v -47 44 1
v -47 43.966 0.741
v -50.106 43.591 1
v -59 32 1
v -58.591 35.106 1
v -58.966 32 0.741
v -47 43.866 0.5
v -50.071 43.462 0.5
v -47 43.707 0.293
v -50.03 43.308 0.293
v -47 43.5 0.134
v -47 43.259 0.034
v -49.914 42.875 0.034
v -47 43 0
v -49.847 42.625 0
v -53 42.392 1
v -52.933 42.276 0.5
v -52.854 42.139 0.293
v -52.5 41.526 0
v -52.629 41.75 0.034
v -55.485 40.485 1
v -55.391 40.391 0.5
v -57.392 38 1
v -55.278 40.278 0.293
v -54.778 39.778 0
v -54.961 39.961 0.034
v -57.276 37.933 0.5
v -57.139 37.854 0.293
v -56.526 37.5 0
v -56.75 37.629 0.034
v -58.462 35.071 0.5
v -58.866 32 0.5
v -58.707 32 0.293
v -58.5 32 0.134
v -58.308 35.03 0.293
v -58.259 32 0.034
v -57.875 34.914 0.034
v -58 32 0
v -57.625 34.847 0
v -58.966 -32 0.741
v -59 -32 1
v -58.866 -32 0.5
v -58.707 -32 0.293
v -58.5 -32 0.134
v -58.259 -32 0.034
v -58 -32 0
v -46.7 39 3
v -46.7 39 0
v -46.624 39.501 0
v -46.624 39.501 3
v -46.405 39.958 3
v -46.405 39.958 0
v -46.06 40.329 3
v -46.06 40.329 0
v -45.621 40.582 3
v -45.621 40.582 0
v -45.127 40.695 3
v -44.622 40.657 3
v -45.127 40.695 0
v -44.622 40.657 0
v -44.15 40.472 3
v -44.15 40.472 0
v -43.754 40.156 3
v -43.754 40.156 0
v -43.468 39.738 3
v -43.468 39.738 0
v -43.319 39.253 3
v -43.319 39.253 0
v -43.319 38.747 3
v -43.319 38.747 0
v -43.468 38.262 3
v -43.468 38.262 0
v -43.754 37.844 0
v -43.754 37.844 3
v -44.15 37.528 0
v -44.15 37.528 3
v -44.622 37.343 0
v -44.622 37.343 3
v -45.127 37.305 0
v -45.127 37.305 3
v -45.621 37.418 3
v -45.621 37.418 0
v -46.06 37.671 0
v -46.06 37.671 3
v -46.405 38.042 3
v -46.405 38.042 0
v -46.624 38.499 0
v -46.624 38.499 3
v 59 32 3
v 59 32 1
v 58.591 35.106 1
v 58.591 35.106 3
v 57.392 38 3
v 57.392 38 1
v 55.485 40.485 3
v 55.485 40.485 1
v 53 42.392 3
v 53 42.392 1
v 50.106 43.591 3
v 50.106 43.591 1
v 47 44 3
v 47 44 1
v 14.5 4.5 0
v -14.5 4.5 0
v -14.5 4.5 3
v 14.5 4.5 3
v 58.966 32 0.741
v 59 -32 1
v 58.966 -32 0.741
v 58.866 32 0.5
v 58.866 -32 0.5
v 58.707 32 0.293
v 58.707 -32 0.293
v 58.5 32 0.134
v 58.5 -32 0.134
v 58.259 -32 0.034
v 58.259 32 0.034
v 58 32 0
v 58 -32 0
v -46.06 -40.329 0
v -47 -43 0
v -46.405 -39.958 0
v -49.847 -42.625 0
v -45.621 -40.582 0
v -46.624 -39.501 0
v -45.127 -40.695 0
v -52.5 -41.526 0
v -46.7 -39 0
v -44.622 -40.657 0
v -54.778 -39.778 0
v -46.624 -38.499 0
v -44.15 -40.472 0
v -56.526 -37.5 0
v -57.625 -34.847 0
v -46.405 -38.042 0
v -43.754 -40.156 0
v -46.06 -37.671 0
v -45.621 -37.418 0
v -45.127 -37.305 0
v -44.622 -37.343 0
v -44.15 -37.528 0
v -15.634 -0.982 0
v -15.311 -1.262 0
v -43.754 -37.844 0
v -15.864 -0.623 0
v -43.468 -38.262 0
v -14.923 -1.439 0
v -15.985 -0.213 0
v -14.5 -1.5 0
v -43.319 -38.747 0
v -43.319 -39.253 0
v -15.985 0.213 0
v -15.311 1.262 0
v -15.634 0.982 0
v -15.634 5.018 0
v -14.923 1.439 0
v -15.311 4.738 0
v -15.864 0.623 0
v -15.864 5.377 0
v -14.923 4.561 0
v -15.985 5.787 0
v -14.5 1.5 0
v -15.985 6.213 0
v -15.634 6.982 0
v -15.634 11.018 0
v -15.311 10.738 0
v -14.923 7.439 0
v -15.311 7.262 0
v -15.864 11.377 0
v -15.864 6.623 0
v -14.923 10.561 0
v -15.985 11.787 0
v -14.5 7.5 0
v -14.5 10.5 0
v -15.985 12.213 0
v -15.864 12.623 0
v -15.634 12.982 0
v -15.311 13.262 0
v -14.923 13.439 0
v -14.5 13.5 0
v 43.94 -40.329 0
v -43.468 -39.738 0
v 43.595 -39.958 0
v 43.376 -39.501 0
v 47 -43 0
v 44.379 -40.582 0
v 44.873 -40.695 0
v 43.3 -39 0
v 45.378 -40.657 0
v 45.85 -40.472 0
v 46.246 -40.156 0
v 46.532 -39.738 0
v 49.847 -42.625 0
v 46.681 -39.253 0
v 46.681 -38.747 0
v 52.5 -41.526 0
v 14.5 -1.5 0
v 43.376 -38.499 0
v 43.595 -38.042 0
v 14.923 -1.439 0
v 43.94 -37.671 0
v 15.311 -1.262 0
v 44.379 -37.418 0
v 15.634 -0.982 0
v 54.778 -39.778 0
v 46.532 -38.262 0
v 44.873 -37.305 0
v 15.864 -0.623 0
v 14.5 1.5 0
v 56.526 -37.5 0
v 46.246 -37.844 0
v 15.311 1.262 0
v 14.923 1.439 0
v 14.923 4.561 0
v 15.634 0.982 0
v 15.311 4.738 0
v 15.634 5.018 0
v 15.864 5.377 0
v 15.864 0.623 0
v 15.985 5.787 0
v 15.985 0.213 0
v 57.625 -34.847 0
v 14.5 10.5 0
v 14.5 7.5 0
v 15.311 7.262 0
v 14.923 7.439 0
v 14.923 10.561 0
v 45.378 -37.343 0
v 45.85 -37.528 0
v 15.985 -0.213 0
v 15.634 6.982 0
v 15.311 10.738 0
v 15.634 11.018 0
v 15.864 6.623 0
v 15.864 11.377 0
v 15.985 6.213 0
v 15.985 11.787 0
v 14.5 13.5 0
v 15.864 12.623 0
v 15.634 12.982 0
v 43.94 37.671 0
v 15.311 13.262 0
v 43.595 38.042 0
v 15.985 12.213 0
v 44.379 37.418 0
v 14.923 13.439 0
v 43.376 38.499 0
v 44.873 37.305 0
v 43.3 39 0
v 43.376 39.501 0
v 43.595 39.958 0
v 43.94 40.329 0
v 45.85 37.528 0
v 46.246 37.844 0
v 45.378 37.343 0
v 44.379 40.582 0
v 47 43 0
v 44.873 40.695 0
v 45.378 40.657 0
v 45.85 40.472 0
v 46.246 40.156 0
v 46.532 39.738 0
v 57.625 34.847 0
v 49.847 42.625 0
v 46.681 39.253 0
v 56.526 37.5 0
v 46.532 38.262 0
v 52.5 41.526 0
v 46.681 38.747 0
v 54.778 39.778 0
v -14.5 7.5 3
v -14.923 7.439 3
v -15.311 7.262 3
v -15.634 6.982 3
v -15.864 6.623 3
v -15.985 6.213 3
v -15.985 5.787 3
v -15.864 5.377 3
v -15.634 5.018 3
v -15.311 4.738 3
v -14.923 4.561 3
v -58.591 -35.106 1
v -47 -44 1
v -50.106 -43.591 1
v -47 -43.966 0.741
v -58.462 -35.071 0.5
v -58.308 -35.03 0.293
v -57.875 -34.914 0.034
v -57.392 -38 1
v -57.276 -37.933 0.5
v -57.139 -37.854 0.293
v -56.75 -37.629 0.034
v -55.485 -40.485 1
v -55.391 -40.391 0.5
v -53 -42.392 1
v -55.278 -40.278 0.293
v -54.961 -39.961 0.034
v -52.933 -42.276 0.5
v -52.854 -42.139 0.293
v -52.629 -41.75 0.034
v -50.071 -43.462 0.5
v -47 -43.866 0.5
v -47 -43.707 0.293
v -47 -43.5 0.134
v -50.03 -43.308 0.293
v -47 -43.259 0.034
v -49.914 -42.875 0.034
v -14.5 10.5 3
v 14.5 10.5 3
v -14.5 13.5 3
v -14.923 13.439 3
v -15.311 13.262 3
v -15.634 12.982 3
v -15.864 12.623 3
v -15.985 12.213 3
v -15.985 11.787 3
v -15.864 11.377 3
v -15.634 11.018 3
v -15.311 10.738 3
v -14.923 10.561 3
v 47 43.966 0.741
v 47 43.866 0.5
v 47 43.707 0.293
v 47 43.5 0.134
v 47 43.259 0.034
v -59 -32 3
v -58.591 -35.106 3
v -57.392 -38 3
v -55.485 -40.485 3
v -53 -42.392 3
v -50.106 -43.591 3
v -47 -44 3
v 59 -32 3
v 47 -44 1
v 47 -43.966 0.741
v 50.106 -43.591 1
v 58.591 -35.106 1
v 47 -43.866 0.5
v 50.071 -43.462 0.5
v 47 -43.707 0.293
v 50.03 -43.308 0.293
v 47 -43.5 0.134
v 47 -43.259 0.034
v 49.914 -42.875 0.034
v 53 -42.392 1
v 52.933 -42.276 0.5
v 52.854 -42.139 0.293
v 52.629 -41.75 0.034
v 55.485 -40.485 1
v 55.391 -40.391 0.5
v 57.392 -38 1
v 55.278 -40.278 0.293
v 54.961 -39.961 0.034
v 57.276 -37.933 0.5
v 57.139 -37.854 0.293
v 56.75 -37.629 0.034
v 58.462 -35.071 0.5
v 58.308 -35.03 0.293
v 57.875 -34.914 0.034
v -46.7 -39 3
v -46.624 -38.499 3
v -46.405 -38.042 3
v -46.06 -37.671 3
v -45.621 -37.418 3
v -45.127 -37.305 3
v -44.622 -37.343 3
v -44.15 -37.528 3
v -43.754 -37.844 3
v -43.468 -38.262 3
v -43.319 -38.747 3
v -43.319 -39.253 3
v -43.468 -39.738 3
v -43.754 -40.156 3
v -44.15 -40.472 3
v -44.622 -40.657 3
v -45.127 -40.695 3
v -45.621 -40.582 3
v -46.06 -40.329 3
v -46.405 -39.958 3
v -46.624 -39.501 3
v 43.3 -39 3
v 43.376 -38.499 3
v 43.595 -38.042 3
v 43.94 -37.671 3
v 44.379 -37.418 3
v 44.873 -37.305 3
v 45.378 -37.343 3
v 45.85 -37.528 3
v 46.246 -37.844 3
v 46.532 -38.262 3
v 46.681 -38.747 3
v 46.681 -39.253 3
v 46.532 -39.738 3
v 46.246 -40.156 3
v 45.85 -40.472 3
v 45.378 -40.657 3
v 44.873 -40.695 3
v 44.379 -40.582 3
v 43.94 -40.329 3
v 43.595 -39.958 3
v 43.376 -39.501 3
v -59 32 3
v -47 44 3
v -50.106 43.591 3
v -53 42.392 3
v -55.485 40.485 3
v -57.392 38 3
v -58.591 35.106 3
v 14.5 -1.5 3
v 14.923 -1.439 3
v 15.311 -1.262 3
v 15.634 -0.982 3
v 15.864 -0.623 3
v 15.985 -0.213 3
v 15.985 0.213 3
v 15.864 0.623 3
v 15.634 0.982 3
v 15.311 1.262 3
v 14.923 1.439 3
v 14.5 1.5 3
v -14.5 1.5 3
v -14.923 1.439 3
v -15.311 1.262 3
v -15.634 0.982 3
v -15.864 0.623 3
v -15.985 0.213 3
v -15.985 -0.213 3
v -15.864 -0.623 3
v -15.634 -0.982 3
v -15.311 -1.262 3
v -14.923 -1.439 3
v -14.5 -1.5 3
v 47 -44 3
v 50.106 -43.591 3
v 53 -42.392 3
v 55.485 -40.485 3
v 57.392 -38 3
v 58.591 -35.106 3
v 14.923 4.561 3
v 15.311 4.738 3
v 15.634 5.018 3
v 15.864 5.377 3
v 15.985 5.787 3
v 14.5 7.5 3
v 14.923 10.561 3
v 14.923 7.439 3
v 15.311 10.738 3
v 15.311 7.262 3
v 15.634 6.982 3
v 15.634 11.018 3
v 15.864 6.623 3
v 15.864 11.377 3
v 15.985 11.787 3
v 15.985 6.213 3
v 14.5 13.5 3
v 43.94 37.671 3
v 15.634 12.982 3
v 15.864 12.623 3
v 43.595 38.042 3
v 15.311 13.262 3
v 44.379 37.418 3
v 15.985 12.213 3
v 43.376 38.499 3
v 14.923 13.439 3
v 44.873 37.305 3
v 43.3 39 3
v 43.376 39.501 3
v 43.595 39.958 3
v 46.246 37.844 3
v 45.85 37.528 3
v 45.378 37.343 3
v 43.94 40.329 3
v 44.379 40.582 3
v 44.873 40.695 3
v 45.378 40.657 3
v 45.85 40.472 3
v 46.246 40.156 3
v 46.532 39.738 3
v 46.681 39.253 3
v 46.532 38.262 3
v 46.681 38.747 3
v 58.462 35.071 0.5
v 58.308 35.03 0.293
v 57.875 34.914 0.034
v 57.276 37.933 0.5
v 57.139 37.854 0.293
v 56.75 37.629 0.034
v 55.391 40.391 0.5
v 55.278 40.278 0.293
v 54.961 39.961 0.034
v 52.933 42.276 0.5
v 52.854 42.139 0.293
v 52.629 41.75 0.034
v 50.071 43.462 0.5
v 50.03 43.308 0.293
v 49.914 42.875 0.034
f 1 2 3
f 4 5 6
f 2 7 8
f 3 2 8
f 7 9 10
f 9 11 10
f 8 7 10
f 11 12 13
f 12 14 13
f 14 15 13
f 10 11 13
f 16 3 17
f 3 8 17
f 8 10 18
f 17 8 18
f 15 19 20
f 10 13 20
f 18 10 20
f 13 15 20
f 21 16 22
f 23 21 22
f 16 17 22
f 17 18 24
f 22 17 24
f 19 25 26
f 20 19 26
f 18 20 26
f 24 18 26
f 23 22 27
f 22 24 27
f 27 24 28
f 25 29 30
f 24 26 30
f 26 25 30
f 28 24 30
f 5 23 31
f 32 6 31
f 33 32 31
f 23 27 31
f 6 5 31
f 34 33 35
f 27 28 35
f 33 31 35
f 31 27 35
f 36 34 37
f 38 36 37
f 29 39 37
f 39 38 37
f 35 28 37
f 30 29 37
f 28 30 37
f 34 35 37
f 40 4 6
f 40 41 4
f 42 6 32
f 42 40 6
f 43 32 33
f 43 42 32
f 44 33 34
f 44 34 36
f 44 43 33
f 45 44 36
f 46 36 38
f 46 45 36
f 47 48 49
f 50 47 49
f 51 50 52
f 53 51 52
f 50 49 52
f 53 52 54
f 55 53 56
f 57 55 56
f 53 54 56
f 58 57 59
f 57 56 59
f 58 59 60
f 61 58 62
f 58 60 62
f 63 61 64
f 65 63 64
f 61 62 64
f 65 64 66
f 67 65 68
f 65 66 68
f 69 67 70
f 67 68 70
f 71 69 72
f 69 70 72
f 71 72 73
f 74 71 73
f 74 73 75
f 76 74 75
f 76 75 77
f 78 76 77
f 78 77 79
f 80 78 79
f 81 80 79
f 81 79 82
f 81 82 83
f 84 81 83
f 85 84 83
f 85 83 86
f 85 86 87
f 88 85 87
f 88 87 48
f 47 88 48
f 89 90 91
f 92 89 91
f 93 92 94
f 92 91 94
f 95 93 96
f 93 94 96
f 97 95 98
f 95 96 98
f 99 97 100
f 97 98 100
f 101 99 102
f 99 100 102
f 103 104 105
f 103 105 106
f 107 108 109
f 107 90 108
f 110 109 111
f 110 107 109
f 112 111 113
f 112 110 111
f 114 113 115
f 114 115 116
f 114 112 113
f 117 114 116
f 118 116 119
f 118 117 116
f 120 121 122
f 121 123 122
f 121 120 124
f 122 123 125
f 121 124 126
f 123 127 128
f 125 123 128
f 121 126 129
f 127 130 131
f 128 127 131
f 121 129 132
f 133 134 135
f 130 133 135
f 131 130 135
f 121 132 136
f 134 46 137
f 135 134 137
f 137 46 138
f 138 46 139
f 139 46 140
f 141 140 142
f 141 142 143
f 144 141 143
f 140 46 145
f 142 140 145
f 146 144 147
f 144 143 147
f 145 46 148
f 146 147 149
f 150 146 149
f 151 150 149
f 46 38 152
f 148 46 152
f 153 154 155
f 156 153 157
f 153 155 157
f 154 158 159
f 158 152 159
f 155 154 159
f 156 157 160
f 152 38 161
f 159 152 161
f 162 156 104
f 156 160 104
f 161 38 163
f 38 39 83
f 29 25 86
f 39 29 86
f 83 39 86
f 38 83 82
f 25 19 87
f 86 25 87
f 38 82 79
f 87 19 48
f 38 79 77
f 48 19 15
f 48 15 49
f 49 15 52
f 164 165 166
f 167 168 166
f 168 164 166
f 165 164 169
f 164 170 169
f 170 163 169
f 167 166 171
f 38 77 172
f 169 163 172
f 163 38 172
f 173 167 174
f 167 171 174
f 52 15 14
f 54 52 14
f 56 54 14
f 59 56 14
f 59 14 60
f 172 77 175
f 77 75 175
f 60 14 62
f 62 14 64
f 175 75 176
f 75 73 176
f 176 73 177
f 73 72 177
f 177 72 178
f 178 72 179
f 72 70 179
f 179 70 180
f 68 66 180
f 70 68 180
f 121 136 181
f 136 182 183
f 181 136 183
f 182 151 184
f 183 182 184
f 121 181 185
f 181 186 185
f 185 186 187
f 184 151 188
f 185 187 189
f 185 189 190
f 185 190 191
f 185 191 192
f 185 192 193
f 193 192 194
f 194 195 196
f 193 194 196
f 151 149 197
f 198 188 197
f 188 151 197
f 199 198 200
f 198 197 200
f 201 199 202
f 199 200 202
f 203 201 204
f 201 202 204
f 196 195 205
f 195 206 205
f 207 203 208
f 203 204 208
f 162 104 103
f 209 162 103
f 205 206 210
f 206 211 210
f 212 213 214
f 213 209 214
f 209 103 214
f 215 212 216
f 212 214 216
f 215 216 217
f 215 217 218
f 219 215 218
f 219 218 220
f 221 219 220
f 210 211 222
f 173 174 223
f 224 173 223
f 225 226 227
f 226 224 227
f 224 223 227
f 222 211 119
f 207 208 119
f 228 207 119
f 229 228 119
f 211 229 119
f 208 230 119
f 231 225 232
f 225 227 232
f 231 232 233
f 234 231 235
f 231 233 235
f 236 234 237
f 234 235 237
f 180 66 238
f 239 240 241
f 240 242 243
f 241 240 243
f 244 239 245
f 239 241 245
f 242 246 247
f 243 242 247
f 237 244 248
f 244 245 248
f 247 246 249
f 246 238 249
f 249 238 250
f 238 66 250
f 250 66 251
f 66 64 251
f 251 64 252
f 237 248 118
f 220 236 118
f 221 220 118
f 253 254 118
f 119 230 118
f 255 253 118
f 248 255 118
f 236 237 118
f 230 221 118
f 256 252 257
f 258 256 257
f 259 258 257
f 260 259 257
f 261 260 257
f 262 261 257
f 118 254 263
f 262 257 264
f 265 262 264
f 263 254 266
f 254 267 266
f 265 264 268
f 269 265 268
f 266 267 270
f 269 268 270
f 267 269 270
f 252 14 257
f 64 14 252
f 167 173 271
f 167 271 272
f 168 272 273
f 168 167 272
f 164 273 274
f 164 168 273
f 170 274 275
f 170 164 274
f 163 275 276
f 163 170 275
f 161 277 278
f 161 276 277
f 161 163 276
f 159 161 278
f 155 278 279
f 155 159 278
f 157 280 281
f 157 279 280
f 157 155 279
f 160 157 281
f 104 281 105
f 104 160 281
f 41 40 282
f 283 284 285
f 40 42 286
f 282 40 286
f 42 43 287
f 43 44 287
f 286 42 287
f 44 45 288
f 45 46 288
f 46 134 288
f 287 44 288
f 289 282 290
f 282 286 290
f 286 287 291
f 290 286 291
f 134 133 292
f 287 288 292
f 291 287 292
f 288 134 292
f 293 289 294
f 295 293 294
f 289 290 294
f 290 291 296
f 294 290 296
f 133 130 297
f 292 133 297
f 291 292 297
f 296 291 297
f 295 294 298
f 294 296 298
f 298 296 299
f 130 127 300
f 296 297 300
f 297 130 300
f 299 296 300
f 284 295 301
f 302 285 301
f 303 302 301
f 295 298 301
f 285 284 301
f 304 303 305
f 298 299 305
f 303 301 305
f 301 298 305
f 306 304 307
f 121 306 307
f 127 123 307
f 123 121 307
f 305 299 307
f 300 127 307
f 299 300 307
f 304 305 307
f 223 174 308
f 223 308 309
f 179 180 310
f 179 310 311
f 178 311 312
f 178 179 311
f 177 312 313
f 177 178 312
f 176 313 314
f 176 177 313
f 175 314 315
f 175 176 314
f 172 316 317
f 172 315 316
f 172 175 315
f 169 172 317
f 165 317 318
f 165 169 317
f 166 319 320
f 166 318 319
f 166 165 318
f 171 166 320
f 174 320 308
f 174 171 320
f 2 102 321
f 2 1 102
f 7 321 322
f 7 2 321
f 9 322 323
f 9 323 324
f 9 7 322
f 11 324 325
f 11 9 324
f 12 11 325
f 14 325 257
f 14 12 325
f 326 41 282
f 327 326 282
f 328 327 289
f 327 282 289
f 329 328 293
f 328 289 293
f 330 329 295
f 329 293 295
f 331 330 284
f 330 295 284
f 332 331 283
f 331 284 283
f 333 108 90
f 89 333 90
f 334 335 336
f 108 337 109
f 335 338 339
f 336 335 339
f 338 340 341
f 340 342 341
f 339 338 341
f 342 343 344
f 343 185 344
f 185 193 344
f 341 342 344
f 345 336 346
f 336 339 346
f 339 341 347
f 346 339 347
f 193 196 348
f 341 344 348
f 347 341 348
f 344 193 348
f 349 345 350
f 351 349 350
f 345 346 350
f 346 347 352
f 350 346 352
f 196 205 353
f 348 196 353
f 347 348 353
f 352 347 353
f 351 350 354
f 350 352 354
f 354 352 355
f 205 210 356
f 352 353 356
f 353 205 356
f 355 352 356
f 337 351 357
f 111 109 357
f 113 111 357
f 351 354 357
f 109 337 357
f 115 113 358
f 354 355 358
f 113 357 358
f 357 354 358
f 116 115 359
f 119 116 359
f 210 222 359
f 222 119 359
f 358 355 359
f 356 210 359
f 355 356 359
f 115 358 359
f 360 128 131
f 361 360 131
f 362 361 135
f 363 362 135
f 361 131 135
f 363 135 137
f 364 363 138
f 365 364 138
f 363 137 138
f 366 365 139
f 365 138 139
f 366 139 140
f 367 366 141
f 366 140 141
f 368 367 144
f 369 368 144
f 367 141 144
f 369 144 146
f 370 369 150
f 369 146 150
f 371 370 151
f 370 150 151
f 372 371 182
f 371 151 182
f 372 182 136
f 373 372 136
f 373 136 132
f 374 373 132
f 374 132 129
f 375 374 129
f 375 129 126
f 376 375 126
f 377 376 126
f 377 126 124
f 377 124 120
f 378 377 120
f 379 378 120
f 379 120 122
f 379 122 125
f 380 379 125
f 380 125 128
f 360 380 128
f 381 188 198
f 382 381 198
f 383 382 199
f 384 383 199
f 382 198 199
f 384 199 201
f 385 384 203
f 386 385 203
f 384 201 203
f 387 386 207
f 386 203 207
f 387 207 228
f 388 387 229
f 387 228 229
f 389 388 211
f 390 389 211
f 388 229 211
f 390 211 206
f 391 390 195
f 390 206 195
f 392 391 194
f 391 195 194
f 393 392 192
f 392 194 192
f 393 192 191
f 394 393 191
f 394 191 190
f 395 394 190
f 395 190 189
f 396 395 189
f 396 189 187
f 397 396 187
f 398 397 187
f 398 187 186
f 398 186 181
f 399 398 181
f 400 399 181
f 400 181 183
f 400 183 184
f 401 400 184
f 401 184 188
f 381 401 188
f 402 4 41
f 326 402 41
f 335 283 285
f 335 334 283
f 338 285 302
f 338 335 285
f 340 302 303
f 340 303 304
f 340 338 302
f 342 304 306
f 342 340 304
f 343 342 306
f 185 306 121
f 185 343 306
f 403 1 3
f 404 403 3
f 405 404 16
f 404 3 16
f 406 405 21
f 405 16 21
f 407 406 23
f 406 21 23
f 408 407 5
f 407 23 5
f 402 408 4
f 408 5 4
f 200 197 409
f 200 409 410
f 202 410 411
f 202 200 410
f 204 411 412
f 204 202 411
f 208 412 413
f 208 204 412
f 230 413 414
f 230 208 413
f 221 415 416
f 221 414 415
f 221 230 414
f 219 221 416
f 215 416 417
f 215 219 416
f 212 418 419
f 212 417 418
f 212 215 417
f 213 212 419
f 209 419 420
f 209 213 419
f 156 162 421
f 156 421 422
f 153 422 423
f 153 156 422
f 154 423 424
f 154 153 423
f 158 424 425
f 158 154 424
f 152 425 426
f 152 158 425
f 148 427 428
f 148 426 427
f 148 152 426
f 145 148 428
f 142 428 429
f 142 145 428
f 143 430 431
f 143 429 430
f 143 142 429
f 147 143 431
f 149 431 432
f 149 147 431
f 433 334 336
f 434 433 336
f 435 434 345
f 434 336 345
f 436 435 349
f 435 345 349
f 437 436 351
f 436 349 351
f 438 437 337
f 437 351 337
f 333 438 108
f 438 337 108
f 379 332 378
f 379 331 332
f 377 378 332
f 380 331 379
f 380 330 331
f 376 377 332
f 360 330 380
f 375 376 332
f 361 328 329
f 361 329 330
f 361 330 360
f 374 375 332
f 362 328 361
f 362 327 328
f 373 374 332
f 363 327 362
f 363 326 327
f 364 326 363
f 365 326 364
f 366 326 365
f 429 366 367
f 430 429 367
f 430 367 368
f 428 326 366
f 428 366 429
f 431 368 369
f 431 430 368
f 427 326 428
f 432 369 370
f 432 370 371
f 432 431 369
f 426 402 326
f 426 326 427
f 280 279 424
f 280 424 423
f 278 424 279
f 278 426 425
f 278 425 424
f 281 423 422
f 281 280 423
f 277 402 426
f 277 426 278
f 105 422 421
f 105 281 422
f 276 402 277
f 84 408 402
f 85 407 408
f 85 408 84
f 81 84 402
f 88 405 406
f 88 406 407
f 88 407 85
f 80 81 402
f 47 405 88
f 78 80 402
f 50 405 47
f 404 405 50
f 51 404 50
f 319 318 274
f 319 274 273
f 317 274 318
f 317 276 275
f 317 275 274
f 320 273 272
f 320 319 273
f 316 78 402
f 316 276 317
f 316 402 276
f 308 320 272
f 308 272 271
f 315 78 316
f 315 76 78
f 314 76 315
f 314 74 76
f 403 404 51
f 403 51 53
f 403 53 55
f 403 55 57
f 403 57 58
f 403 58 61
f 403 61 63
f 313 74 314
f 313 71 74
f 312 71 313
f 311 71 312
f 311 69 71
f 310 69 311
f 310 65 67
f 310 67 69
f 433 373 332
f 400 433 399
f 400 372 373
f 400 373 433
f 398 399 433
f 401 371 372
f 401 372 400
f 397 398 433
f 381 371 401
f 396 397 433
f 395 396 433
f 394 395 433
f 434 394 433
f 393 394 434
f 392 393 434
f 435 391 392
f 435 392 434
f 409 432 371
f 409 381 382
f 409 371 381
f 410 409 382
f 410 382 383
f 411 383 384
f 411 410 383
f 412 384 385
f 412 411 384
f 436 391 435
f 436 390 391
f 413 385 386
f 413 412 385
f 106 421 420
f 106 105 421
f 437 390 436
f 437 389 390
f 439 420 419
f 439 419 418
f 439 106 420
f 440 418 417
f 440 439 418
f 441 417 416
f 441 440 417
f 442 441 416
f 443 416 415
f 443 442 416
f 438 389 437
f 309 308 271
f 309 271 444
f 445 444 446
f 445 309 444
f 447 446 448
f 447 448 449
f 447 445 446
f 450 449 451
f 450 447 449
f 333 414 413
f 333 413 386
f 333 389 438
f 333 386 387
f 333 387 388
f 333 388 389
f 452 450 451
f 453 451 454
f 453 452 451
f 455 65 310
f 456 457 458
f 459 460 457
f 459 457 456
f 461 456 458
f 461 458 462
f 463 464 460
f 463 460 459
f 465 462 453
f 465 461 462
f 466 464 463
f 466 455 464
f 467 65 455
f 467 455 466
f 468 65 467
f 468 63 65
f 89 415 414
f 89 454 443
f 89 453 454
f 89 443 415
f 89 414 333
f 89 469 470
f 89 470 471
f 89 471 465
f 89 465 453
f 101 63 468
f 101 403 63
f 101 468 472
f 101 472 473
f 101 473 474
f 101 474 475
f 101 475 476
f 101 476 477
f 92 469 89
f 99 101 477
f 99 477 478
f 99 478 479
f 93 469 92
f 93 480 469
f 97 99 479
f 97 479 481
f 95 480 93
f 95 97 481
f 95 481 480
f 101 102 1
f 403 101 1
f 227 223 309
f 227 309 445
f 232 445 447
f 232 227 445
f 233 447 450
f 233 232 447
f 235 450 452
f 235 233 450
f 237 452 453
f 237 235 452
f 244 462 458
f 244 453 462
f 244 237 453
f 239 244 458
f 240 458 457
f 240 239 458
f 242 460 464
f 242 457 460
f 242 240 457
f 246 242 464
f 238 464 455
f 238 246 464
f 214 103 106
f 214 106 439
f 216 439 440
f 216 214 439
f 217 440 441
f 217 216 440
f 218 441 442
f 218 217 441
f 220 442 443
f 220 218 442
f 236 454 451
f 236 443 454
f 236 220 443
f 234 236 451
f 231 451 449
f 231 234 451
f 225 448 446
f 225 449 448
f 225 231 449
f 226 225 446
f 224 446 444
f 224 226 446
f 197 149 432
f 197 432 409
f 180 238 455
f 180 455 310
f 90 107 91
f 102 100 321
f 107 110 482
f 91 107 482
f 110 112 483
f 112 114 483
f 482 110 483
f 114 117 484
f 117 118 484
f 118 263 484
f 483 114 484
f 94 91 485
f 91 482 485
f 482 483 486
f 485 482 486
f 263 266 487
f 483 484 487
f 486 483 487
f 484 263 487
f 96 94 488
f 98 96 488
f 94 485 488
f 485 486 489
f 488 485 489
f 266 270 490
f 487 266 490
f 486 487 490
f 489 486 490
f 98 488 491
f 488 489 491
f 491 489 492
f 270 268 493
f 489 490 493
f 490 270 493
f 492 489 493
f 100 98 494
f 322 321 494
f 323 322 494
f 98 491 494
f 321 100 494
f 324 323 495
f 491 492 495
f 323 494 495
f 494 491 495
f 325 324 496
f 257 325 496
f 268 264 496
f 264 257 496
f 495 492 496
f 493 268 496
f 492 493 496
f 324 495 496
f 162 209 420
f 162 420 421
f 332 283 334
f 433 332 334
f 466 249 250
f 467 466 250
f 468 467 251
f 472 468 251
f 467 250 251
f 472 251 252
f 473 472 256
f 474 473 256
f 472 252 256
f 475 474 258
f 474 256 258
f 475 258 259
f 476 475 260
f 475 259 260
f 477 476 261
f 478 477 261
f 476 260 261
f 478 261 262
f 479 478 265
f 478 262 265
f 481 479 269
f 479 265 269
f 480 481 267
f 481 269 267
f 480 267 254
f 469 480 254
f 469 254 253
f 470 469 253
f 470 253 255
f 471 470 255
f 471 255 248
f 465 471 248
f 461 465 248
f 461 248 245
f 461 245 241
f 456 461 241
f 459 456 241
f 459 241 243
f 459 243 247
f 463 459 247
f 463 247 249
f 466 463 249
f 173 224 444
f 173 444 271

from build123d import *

# Parameters (mm, degrees)
BOSS_EXTRUDE1_DEPTH = 3
FILLET1_R           = 1
SKETCH2_R           = 1.7
CUT_EXTRUDE2_DEPTH  = 74.661387443
CUT_EXTRUDE3_DEPTH  = 74.661387443


with BuildPart() as part:
    # Sketch1 → Boss-Extrude1 (new body)
    with BuildSketch(Plane.XY):
        with BuildLine():
            Line((-47, -44), (47, -44))
            ThreePointArc((47, -44), (55.485281374, -40.485281374), (59, -32))
            Line((59, -32), (59, 32))
            ThreePointArc((59, 32), (55.485281374, 40.485281374), (47, 44))
            Line((47, 44), (-47, 44))
            ThreePointArc((-47, 44), (-55.485281374, 40.485281374), (-59, 32))
            Line((-59, 32), (-59, -32))
            ThreePointArc((-59, -32), (-55.485281374, -40.485281374), (-47, -44))
        make_face()
    extrude(amount=BOSS_EXTRUDE1_DEPTH)

    # Fillet1
    fillet1_edges = [part.edges().sort_by_distance(p)[0] for p in [
        (-59, 0, 0),
        (-55.485281374, 40.485281374, 0),
        (0, 44, 0),
        (55.485281374, 40.485281374, 0),
        (59, 0, 0),
        (55.485281374, -40.485281374, 0),
        (0, -44, 0),
        (-55.485281374, -40.485281374, 0),
    ]]
    fillet(fillet1_edges, radius=FILLET1_R)

    # Sketch2 → Cut-Extrude2 (cut, through all)
    with BuildSketch(Plane(origin=(0, 0, 0), x_dir=(-1, 0, 0), z_dir=(0, 0, -1))):
        with Locations((-45, 39)):
            Circle(SKETCH2_R)
        with Locations((-45, -39)):
            Circle(SKETCH2_R)
        with Locations((45, -39)):
            Circle(SKETCH2_R)
        with Locations((45, 39)):
            Circle(SKETCH2_R)
    extrude(amount=-CUT_EXTRUDE2_DEPTH, mode=Mode.SUBTRACT)

    # Sketch6 → Cut-Extrude3 (cut, through all)
    with BuildSketch(Plane(origin=(0, 0, 0), x_dir=(-1, 0, 0), z_dir=(0, 0, -1))):
        with BuildLine():
            Line((-14.5, 1.5), (14.5, 1.5))
            ThreePointArc((14.5, 1.5), (16, 0), (14.5, -1.5))
            Line((14.5, -1.5), (-14.5, -1.5))
            ThreePointArc((-14.5, -1.5), (-16, 0), (-14.5, 1.5))
        make_face()
        with BuildLine():
            Line((-14.5, 7.5), (14.5, 7.5))
            ThreePointArc((14.5, 7.5), (16, 6), (14.5, 4.5))
            Line((14.5, 4.5), (-14.5, 4.5))
            ThreePointArc((-14.5, 4.5), (-16, 6), (-14.5, 7.5))
        make_face()
        with BuildLine():
            Line((-14.5, 13.5), (14.5, 13.5))
            ThreePointArc((14.5, 13.5), (16, 12), (14.5, 10.5))
            Line((14.5, 10.5), (-14.5, 10.5))
            ThreePointArc((-14.5, 10.5), (-16, 12), (-14.5, 13.5))
        make_face()
    extrude(amount=-CUT_EXTRUDE3_DEPTH, mode=Mode.SUBTRACT)


solid = part.part
